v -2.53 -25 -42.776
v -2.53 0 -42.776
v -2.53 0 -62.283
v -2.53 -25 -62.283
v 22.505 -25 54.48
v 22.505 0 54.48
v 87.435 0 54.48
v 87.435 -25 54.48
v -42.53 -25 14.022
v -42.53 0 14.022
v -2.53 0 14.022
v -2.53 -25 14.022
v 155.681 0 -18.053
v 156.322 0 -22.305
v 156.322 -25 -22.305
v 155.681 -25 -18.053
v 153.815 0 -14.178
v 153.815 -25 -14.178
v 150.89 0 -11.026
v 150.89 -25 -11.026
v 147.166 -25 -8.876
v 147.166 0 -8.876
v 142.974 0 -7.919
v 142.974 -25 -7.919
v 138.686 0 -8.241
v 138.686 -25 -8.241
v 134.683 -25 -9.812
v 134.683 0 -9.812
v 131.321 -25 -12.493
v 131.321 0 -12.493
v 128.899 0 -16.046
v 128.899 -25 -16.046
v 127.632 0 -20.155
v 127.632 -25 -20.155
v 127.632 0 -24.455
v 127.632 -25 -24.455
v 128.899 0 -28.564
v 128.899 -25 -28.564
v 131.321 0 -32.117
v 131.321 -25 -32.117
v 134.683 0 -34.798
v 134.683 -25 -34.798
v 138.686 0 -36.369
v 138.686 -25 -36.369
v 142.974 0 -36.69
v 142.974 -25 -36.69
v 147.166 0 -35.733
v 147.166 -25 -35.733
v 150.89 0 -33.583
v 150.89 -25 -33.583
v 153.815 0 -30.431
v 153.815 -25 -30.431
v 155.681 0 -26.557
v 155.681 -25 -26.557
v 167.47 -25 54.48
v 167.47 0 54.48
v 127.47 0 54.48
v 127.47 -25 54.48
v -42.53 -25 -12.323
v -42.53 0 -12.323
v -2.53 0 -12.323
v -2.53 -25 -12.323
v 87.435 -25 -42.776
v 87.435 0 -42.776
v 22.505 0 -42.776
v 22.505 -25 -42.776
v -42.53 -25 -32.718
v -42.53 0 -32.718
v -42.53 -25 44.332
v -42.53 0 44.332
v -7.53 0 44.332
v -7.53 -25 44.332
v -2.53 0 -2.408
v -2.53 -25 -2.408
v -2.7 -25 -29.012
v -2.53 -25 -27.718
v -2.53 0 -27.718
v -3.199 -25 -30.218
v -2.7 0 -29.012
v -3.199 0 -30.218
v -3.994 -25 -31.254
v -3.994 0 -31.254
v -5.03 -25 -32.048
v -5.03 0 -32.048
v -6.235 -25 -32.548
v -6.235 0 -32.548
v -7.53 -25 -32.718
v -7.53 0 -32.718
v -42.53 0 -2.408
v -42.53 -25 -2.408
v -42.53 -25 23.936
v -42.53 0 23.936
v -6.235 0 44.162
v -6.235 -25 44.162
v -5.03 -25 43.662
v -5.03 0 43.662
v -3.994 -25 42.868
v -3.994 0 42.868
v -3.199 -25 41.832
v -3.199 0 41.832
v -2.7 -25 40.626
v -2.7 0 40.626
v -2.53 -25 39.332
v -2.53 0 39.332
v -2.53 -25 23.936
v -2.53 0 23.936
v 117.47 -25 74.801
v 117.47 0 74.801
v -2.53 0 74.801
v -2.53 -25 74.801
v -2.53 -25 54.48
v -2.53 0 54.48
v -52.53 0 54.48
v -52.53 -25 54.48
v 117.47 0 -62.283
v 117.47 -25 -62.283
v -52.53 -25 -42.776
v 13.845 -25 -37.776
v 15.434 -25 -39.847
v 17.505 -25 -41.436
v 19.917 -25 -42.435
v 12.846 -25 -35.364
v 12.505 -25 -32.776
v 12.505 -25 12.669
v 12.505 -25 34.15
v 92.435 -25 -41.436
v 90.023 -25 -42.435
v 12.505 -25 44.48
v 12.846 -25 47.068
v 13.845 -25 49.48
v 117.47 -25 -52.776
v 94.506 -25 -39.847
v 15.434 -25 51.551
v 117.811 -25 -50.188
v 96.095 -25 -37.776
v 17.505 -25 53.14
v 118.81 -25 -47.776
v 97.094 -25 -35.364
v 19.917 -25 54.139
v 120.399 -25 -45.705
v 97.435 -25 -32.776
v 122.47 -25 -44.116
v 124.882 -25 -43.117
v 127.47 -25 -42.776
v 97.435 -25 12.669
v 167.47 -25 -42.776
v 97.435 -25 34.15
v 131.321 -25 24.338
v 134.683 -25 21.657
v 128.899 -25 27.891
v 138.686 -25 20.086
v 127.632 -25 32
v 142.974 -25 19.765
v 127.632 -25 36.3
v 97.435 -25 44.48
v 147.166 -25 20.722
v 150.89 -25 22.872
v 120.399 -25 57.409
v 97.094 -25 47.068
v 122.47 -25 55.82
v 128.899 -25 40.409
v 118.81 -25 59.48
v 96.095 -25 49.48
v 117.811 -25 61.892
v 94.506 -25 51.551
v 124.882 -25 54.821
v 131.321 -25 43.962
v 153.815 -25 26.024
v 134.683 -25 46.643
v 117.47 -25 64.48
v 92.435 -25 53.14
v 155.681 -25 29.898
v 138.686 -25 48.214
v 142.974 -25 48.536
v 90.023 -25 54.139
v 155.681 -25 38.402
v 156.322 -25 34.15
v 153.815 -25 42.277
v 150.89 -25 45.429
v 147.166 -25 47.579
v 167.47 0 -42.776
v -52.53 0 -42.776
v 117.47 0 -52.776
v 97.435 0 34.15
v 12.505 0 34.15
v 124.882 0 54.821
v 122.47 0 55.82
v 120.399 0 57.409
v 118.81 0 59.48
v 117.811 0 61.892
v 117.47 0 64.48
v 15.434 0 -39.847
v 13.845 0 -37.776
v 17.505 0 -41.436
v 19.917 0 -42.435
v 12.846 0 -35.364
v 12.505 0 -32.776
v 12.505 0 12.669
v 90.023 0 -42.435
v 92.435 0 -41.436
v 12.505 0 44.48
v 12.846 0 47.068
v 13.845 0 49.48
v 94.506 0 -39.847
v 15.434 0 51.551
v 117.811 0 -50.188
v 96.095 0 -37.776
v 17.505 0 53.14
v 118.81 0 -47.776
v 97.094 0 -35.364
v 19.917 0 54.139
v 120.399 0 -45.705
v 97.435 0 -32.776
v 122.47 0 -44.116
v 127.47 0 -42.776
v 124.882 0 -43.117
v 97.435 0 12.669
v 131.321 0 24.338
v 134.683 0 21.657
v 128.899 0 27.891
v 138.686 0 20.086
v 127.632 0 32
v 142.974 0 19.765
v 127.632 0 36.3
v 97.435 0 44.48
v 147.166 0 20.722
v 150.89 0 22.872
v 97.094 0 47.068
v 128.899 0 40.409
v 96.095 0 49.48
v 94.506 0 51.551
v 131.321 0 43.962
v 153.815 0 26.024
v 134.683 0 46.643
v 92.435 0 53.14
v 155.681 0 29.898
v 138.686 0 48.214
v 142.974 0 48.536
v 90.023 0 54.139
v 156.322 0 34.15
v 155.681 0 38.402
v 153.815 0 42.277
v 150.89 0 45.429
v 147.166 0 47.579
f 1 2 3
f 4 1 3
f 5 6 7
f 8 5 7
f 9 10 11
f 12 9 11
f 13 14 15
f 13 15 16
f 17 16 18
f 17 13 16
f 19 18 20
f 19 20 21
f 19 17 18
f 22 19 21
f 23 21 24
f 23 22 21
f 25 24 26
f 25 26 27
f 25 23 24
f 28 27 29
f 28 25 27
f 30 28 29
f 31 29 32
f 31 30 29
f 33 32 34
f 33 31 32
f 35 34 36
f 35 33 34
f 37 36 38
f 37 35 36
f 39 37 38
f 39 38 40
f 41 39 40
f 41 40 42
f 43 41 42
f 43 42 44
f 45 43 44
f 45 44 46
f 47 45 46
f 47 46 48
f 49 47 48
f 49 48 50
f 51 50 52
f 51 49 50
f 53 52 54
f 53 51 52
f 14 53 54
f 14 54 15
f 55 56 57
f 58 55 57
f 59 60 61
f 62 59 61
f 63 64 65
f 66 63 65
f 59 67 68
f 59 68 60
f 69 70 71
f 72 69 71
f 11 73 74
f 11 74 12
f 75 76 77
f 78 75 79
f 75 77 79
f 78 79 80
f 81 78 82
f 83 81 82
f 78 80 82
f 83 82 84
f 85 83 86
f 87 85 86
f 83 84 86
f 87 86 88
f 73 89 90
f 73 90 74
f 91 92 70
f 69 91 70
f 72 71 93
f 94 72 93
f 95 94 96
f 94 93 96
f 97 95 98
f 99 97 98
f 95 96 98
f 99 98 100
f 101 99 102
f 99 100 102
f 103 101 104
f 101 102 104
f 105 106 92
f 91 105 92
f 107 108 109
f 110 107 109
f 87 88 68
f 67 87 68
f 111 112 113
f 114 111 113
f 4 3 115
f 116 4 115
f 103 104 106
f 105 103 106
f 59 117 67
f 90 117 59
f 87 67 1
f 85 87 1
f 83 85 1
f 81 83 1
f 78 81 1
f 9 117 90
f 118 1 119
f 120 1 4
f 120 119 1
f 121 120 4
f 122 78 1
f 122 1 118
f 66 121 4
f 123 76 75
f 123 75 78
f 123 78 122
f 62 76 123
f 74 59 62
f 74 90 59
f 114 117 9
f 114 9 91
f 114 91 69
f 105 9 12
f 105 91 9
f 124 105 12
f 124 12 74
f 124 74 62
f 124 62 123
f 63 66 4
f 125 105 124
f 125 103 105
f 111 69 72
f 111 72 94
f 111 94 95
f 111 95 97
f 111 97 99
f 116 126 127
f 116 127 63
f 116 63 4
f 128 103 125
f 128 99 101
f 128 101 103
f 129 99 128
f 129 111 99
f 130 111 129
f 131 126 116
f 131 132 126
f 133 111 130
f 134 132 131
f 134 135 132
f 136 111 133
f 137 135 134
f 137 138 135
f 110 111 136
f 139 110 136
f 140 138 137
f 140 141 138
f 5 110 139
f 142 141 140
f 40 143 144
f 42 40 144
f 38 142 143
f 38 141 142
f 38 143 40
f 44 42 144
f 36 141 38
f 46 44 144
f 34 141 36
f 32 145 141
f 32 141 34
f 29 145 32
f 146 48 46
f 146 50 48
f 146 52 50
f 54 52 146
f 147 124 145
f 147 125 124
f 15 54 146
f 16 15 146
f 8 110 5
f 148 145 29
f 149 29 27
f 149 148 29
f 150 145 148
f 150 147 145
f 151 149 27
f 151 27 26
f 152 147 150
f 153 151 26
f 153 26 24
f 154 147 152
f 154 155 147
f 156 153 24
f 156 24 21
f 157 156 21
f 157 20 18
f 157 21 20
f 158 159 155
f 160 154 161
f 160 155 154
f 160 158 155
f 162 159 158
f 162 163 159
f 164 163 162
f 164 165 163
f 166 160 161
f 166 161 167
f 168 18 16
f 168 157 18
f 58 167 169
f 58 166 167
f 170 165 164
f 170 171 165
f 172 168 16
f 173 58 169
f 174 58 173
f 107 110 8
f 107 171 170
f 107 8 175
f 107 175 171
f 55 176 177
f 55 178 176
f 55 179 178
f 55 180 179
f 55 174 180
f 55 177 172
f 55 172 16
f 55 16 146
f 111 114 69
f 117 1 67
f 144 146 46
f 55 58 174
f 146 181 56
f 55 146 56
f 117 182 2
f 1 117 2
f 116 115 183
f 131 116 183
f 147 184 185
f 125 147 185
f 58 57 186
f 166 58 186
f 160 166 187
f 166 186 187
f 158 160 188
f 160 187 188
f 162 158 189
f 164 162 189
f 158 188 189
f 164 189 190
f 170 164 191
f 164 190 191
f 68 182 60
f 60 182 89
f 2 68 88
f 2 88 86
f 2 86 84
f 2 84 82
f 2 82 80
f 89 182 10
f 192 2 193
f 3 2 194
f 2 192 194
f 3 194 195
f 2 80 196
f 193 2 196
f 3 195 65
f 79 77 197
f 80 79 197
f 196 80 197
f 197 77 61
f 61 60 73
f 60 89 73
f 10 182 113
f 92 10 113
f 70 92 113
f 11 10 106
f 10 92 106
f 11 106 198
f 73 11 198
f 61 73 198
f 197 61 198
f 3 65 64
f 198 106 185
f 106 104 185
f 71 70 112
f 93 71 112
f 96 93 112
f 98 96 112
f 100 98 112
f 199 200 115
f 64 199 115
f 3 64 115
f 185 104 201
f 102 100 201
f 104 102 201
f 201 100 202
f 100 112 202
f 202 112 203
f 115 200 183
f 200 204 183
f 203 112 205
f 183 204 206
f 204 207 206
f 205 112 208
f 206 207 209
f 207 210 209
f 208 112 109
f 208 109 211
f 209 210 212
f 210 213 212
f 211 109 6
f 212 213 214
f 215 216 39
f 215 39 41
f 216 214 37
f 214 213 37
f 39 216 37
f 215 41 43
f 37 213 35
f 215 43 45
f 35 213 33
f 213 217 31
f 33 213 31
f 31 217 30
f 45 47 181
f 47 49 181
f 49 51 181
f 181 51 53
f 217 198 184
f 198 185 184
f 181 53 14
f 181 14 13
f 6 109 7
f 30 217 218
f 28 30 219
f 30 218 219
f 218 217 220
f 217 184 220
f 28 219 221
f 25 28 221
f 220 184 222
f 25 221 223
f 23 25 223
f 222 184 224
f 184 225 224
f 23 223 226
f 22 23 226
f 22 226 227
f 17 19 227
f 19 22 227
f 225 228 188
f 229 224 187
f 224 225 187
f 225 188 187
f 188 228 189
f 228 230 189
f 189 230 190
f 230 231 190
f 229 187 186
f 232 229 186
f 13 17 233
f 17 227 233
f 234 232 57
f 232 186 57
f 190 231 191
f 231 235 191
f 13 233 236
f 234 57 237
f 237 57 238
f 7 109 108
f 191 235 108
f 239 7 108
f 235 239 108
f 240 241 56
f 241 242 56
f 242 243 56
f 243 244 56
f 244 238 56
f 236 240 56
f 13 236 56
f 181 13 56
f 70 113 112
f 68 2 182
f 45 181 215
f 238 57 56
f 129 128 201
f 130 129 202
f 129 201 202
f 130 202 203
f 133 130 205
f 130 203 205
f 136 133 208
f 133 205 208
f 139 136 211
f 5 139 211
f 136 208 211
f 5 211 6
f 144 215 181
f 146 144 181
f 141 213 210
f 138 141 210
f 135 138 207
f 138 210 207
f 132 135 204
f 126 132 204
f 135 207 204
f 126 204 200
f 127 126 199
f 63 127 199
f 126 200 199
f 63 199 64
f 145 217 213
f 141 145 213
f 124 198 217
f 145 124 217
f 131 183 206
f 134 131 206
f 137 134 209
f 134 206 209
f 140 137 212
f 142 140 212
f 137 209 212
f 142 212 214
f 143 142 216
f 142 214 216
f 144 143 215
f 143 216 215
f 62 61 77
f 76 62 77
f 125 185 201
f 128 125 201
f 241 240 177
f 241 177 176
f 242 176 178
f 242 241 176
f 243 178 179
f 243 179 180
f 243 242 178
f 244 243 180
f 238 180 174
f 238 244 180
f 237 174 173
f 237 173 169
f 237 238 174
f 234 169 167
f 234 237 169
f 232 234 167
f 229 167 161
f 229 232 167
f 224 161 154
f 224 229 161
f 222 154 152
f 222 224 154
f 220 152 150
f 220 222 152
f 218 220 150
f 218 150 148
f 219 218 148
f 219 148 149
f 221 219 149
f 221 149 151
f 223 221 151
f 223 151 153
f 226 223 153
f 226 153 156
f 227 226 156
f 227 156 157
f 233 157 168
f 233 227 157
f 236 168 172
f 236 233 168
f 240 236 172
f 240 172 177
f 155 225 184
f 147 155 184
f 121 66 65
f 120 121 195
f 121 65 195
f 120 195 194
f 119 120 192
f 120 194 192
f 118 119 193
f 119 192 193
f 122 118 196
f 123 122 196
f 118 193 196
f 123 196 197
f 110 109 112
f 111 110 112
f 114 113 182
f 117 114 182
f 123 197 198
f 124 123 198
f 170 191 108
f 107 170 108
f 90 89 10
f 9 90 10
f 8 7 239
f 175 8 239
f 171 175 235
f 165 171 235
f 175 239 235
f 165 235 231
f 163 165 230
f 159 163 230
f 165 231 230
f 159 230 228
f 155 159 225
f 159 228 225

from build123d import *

# Parameters (mm, degrees)
F0_W     = 40
F0_H     = 16.429857
F0_R     = 14.425633
F1_DEPTH = 25


with BuildPart() as f1:
    # F0 (on Front) → F1 (new body)
    with BuildSketch(Plane.XZ):
        with BuildLine():
            Line((-2.529519, 54.480218), (-52.529519, 54.480218))
            Line((-52.529519, 54.480218), (-52.529519, -42.776029))
            Line((-52.529519, -42.776029), (-2.529519, -42.776029))
            Line((-2.529519, -42.776029), (-2.529519, -62.283013))
            Line((-2.529519, -62.283013), (117.470481, -62.283013))
            Line((117.470481, -62.283013), (117.470481, -52.776029))
            ThreePointArc((117.470481, -52.776029), (120.399413, -45.704961), (127.470481, -42.776029))
            Line((127.470481, -42.776029), (167.470481, -42.776029))
            Line((167.470481, -42.776029), (167.470481, 54.480218))
            Line((167.470481, 54.480218), (127.470481, 54.480218))
            ThreePointArc((127.470481, 54.480218), (120.399413, 57.40915), (117.470481, 64.480218))
            Line((117.470481, 64.480218), (117.470481, 74.800561))
            Line((117.470481, 74.800561), (-2.529519, 74.800561))
            Line((-2.529519, 74.800561), (-2.529519, 54.480218))
        make_face()
        with BuildLine():
            Line((-7.529519, -32.718264), (-42.529519, -32.718264))
            Line((-42.529519, -32.718264), (-42.529519, -12.32258))
            Line((-42.529519, -12.32258), (-2.529519, -12.32258))
            Line((-2.529519, -12.32258), (-2.529519, -27.718264))
            ThreePointArc((-2.529519, -27.718264), (-3.993985, -31.253797), (-7.529519, -32.718264))
        make_face(mode=Mode.SUBTRACT)
        with Locations((-22.529519, 5.806916)):
            Rectangle(F0_W, F0_H, mode=Mode.SUBTRACT)
        with BuildLine():
            Line((87.435027, -42.776029), (22.504957, -42.776029))
            ThreePointArc((22.504957, -42.776029), (15.433889, -39.847097), (12.504957, -32.776029))
            Line((12.504957, -32.776029), (12.504957, 12.669074))
            Line((12.504957, 12.669074), (52.470481, 12.669074))
            Line((52.470481, 12.669074), (97.435027, 12.669074))
            Line((97.435027, 12.669074), (97.435027, -32.776029))
            ThreePointArc((97.435027, -32.776029), (94.506095, -39.847097), (87.435027, -42.776029))
        make_face(mode=Mode.SUBTRACT)
        with Locations((141.896114, -22.304697)):
            Circle(F0_R, mode=Mode.SUBTRACT)
        with BuildLine():
            ThreePointArc((-7.529519, 44.332098), (-3.993985, 42.867632), (-2.529519, 39.332098))
            Line((-2.529519, 39.332098), (-2.529519, 23.936415))
            Line((-2.529519, 23.936415), (-42.529519, 23.936415))
            Line((-42.529519, 23.936415), (-42.529519, 44.332098))
            Line((-42.529519, 44.332098), (-7.529519, 44.332098))
        make_face(mode=Mode.SUBTRACT)
        with BuildLine():
            ThreePointArc((12.504957, 44.480218), (15.433889, 51.551286), (22.504957, 54.480218))
            Line((22.504957, 54.480218), (87.435027, 54.480218))
            ThreePointArc((87.435027, 54.480218), (94.506095, 51.551286), (97.435027, 44.480218))
            Line((97.435027, 44.480218), (97.435027, 34.150277))
            Line((97.435027, 34.150277), (12.504957, 34.150277))
            Line((12.504957, 34.150277), (12.504957, 44.480218))
        make_face(mode=Mode.SUBTRACT)
        with Locations((141.896114, 34.150277)):
            Circle(F0_R, mode=Mode.SUBTRACT)
    extrude(amount=F1_DEPTH)


solid = f1.part
